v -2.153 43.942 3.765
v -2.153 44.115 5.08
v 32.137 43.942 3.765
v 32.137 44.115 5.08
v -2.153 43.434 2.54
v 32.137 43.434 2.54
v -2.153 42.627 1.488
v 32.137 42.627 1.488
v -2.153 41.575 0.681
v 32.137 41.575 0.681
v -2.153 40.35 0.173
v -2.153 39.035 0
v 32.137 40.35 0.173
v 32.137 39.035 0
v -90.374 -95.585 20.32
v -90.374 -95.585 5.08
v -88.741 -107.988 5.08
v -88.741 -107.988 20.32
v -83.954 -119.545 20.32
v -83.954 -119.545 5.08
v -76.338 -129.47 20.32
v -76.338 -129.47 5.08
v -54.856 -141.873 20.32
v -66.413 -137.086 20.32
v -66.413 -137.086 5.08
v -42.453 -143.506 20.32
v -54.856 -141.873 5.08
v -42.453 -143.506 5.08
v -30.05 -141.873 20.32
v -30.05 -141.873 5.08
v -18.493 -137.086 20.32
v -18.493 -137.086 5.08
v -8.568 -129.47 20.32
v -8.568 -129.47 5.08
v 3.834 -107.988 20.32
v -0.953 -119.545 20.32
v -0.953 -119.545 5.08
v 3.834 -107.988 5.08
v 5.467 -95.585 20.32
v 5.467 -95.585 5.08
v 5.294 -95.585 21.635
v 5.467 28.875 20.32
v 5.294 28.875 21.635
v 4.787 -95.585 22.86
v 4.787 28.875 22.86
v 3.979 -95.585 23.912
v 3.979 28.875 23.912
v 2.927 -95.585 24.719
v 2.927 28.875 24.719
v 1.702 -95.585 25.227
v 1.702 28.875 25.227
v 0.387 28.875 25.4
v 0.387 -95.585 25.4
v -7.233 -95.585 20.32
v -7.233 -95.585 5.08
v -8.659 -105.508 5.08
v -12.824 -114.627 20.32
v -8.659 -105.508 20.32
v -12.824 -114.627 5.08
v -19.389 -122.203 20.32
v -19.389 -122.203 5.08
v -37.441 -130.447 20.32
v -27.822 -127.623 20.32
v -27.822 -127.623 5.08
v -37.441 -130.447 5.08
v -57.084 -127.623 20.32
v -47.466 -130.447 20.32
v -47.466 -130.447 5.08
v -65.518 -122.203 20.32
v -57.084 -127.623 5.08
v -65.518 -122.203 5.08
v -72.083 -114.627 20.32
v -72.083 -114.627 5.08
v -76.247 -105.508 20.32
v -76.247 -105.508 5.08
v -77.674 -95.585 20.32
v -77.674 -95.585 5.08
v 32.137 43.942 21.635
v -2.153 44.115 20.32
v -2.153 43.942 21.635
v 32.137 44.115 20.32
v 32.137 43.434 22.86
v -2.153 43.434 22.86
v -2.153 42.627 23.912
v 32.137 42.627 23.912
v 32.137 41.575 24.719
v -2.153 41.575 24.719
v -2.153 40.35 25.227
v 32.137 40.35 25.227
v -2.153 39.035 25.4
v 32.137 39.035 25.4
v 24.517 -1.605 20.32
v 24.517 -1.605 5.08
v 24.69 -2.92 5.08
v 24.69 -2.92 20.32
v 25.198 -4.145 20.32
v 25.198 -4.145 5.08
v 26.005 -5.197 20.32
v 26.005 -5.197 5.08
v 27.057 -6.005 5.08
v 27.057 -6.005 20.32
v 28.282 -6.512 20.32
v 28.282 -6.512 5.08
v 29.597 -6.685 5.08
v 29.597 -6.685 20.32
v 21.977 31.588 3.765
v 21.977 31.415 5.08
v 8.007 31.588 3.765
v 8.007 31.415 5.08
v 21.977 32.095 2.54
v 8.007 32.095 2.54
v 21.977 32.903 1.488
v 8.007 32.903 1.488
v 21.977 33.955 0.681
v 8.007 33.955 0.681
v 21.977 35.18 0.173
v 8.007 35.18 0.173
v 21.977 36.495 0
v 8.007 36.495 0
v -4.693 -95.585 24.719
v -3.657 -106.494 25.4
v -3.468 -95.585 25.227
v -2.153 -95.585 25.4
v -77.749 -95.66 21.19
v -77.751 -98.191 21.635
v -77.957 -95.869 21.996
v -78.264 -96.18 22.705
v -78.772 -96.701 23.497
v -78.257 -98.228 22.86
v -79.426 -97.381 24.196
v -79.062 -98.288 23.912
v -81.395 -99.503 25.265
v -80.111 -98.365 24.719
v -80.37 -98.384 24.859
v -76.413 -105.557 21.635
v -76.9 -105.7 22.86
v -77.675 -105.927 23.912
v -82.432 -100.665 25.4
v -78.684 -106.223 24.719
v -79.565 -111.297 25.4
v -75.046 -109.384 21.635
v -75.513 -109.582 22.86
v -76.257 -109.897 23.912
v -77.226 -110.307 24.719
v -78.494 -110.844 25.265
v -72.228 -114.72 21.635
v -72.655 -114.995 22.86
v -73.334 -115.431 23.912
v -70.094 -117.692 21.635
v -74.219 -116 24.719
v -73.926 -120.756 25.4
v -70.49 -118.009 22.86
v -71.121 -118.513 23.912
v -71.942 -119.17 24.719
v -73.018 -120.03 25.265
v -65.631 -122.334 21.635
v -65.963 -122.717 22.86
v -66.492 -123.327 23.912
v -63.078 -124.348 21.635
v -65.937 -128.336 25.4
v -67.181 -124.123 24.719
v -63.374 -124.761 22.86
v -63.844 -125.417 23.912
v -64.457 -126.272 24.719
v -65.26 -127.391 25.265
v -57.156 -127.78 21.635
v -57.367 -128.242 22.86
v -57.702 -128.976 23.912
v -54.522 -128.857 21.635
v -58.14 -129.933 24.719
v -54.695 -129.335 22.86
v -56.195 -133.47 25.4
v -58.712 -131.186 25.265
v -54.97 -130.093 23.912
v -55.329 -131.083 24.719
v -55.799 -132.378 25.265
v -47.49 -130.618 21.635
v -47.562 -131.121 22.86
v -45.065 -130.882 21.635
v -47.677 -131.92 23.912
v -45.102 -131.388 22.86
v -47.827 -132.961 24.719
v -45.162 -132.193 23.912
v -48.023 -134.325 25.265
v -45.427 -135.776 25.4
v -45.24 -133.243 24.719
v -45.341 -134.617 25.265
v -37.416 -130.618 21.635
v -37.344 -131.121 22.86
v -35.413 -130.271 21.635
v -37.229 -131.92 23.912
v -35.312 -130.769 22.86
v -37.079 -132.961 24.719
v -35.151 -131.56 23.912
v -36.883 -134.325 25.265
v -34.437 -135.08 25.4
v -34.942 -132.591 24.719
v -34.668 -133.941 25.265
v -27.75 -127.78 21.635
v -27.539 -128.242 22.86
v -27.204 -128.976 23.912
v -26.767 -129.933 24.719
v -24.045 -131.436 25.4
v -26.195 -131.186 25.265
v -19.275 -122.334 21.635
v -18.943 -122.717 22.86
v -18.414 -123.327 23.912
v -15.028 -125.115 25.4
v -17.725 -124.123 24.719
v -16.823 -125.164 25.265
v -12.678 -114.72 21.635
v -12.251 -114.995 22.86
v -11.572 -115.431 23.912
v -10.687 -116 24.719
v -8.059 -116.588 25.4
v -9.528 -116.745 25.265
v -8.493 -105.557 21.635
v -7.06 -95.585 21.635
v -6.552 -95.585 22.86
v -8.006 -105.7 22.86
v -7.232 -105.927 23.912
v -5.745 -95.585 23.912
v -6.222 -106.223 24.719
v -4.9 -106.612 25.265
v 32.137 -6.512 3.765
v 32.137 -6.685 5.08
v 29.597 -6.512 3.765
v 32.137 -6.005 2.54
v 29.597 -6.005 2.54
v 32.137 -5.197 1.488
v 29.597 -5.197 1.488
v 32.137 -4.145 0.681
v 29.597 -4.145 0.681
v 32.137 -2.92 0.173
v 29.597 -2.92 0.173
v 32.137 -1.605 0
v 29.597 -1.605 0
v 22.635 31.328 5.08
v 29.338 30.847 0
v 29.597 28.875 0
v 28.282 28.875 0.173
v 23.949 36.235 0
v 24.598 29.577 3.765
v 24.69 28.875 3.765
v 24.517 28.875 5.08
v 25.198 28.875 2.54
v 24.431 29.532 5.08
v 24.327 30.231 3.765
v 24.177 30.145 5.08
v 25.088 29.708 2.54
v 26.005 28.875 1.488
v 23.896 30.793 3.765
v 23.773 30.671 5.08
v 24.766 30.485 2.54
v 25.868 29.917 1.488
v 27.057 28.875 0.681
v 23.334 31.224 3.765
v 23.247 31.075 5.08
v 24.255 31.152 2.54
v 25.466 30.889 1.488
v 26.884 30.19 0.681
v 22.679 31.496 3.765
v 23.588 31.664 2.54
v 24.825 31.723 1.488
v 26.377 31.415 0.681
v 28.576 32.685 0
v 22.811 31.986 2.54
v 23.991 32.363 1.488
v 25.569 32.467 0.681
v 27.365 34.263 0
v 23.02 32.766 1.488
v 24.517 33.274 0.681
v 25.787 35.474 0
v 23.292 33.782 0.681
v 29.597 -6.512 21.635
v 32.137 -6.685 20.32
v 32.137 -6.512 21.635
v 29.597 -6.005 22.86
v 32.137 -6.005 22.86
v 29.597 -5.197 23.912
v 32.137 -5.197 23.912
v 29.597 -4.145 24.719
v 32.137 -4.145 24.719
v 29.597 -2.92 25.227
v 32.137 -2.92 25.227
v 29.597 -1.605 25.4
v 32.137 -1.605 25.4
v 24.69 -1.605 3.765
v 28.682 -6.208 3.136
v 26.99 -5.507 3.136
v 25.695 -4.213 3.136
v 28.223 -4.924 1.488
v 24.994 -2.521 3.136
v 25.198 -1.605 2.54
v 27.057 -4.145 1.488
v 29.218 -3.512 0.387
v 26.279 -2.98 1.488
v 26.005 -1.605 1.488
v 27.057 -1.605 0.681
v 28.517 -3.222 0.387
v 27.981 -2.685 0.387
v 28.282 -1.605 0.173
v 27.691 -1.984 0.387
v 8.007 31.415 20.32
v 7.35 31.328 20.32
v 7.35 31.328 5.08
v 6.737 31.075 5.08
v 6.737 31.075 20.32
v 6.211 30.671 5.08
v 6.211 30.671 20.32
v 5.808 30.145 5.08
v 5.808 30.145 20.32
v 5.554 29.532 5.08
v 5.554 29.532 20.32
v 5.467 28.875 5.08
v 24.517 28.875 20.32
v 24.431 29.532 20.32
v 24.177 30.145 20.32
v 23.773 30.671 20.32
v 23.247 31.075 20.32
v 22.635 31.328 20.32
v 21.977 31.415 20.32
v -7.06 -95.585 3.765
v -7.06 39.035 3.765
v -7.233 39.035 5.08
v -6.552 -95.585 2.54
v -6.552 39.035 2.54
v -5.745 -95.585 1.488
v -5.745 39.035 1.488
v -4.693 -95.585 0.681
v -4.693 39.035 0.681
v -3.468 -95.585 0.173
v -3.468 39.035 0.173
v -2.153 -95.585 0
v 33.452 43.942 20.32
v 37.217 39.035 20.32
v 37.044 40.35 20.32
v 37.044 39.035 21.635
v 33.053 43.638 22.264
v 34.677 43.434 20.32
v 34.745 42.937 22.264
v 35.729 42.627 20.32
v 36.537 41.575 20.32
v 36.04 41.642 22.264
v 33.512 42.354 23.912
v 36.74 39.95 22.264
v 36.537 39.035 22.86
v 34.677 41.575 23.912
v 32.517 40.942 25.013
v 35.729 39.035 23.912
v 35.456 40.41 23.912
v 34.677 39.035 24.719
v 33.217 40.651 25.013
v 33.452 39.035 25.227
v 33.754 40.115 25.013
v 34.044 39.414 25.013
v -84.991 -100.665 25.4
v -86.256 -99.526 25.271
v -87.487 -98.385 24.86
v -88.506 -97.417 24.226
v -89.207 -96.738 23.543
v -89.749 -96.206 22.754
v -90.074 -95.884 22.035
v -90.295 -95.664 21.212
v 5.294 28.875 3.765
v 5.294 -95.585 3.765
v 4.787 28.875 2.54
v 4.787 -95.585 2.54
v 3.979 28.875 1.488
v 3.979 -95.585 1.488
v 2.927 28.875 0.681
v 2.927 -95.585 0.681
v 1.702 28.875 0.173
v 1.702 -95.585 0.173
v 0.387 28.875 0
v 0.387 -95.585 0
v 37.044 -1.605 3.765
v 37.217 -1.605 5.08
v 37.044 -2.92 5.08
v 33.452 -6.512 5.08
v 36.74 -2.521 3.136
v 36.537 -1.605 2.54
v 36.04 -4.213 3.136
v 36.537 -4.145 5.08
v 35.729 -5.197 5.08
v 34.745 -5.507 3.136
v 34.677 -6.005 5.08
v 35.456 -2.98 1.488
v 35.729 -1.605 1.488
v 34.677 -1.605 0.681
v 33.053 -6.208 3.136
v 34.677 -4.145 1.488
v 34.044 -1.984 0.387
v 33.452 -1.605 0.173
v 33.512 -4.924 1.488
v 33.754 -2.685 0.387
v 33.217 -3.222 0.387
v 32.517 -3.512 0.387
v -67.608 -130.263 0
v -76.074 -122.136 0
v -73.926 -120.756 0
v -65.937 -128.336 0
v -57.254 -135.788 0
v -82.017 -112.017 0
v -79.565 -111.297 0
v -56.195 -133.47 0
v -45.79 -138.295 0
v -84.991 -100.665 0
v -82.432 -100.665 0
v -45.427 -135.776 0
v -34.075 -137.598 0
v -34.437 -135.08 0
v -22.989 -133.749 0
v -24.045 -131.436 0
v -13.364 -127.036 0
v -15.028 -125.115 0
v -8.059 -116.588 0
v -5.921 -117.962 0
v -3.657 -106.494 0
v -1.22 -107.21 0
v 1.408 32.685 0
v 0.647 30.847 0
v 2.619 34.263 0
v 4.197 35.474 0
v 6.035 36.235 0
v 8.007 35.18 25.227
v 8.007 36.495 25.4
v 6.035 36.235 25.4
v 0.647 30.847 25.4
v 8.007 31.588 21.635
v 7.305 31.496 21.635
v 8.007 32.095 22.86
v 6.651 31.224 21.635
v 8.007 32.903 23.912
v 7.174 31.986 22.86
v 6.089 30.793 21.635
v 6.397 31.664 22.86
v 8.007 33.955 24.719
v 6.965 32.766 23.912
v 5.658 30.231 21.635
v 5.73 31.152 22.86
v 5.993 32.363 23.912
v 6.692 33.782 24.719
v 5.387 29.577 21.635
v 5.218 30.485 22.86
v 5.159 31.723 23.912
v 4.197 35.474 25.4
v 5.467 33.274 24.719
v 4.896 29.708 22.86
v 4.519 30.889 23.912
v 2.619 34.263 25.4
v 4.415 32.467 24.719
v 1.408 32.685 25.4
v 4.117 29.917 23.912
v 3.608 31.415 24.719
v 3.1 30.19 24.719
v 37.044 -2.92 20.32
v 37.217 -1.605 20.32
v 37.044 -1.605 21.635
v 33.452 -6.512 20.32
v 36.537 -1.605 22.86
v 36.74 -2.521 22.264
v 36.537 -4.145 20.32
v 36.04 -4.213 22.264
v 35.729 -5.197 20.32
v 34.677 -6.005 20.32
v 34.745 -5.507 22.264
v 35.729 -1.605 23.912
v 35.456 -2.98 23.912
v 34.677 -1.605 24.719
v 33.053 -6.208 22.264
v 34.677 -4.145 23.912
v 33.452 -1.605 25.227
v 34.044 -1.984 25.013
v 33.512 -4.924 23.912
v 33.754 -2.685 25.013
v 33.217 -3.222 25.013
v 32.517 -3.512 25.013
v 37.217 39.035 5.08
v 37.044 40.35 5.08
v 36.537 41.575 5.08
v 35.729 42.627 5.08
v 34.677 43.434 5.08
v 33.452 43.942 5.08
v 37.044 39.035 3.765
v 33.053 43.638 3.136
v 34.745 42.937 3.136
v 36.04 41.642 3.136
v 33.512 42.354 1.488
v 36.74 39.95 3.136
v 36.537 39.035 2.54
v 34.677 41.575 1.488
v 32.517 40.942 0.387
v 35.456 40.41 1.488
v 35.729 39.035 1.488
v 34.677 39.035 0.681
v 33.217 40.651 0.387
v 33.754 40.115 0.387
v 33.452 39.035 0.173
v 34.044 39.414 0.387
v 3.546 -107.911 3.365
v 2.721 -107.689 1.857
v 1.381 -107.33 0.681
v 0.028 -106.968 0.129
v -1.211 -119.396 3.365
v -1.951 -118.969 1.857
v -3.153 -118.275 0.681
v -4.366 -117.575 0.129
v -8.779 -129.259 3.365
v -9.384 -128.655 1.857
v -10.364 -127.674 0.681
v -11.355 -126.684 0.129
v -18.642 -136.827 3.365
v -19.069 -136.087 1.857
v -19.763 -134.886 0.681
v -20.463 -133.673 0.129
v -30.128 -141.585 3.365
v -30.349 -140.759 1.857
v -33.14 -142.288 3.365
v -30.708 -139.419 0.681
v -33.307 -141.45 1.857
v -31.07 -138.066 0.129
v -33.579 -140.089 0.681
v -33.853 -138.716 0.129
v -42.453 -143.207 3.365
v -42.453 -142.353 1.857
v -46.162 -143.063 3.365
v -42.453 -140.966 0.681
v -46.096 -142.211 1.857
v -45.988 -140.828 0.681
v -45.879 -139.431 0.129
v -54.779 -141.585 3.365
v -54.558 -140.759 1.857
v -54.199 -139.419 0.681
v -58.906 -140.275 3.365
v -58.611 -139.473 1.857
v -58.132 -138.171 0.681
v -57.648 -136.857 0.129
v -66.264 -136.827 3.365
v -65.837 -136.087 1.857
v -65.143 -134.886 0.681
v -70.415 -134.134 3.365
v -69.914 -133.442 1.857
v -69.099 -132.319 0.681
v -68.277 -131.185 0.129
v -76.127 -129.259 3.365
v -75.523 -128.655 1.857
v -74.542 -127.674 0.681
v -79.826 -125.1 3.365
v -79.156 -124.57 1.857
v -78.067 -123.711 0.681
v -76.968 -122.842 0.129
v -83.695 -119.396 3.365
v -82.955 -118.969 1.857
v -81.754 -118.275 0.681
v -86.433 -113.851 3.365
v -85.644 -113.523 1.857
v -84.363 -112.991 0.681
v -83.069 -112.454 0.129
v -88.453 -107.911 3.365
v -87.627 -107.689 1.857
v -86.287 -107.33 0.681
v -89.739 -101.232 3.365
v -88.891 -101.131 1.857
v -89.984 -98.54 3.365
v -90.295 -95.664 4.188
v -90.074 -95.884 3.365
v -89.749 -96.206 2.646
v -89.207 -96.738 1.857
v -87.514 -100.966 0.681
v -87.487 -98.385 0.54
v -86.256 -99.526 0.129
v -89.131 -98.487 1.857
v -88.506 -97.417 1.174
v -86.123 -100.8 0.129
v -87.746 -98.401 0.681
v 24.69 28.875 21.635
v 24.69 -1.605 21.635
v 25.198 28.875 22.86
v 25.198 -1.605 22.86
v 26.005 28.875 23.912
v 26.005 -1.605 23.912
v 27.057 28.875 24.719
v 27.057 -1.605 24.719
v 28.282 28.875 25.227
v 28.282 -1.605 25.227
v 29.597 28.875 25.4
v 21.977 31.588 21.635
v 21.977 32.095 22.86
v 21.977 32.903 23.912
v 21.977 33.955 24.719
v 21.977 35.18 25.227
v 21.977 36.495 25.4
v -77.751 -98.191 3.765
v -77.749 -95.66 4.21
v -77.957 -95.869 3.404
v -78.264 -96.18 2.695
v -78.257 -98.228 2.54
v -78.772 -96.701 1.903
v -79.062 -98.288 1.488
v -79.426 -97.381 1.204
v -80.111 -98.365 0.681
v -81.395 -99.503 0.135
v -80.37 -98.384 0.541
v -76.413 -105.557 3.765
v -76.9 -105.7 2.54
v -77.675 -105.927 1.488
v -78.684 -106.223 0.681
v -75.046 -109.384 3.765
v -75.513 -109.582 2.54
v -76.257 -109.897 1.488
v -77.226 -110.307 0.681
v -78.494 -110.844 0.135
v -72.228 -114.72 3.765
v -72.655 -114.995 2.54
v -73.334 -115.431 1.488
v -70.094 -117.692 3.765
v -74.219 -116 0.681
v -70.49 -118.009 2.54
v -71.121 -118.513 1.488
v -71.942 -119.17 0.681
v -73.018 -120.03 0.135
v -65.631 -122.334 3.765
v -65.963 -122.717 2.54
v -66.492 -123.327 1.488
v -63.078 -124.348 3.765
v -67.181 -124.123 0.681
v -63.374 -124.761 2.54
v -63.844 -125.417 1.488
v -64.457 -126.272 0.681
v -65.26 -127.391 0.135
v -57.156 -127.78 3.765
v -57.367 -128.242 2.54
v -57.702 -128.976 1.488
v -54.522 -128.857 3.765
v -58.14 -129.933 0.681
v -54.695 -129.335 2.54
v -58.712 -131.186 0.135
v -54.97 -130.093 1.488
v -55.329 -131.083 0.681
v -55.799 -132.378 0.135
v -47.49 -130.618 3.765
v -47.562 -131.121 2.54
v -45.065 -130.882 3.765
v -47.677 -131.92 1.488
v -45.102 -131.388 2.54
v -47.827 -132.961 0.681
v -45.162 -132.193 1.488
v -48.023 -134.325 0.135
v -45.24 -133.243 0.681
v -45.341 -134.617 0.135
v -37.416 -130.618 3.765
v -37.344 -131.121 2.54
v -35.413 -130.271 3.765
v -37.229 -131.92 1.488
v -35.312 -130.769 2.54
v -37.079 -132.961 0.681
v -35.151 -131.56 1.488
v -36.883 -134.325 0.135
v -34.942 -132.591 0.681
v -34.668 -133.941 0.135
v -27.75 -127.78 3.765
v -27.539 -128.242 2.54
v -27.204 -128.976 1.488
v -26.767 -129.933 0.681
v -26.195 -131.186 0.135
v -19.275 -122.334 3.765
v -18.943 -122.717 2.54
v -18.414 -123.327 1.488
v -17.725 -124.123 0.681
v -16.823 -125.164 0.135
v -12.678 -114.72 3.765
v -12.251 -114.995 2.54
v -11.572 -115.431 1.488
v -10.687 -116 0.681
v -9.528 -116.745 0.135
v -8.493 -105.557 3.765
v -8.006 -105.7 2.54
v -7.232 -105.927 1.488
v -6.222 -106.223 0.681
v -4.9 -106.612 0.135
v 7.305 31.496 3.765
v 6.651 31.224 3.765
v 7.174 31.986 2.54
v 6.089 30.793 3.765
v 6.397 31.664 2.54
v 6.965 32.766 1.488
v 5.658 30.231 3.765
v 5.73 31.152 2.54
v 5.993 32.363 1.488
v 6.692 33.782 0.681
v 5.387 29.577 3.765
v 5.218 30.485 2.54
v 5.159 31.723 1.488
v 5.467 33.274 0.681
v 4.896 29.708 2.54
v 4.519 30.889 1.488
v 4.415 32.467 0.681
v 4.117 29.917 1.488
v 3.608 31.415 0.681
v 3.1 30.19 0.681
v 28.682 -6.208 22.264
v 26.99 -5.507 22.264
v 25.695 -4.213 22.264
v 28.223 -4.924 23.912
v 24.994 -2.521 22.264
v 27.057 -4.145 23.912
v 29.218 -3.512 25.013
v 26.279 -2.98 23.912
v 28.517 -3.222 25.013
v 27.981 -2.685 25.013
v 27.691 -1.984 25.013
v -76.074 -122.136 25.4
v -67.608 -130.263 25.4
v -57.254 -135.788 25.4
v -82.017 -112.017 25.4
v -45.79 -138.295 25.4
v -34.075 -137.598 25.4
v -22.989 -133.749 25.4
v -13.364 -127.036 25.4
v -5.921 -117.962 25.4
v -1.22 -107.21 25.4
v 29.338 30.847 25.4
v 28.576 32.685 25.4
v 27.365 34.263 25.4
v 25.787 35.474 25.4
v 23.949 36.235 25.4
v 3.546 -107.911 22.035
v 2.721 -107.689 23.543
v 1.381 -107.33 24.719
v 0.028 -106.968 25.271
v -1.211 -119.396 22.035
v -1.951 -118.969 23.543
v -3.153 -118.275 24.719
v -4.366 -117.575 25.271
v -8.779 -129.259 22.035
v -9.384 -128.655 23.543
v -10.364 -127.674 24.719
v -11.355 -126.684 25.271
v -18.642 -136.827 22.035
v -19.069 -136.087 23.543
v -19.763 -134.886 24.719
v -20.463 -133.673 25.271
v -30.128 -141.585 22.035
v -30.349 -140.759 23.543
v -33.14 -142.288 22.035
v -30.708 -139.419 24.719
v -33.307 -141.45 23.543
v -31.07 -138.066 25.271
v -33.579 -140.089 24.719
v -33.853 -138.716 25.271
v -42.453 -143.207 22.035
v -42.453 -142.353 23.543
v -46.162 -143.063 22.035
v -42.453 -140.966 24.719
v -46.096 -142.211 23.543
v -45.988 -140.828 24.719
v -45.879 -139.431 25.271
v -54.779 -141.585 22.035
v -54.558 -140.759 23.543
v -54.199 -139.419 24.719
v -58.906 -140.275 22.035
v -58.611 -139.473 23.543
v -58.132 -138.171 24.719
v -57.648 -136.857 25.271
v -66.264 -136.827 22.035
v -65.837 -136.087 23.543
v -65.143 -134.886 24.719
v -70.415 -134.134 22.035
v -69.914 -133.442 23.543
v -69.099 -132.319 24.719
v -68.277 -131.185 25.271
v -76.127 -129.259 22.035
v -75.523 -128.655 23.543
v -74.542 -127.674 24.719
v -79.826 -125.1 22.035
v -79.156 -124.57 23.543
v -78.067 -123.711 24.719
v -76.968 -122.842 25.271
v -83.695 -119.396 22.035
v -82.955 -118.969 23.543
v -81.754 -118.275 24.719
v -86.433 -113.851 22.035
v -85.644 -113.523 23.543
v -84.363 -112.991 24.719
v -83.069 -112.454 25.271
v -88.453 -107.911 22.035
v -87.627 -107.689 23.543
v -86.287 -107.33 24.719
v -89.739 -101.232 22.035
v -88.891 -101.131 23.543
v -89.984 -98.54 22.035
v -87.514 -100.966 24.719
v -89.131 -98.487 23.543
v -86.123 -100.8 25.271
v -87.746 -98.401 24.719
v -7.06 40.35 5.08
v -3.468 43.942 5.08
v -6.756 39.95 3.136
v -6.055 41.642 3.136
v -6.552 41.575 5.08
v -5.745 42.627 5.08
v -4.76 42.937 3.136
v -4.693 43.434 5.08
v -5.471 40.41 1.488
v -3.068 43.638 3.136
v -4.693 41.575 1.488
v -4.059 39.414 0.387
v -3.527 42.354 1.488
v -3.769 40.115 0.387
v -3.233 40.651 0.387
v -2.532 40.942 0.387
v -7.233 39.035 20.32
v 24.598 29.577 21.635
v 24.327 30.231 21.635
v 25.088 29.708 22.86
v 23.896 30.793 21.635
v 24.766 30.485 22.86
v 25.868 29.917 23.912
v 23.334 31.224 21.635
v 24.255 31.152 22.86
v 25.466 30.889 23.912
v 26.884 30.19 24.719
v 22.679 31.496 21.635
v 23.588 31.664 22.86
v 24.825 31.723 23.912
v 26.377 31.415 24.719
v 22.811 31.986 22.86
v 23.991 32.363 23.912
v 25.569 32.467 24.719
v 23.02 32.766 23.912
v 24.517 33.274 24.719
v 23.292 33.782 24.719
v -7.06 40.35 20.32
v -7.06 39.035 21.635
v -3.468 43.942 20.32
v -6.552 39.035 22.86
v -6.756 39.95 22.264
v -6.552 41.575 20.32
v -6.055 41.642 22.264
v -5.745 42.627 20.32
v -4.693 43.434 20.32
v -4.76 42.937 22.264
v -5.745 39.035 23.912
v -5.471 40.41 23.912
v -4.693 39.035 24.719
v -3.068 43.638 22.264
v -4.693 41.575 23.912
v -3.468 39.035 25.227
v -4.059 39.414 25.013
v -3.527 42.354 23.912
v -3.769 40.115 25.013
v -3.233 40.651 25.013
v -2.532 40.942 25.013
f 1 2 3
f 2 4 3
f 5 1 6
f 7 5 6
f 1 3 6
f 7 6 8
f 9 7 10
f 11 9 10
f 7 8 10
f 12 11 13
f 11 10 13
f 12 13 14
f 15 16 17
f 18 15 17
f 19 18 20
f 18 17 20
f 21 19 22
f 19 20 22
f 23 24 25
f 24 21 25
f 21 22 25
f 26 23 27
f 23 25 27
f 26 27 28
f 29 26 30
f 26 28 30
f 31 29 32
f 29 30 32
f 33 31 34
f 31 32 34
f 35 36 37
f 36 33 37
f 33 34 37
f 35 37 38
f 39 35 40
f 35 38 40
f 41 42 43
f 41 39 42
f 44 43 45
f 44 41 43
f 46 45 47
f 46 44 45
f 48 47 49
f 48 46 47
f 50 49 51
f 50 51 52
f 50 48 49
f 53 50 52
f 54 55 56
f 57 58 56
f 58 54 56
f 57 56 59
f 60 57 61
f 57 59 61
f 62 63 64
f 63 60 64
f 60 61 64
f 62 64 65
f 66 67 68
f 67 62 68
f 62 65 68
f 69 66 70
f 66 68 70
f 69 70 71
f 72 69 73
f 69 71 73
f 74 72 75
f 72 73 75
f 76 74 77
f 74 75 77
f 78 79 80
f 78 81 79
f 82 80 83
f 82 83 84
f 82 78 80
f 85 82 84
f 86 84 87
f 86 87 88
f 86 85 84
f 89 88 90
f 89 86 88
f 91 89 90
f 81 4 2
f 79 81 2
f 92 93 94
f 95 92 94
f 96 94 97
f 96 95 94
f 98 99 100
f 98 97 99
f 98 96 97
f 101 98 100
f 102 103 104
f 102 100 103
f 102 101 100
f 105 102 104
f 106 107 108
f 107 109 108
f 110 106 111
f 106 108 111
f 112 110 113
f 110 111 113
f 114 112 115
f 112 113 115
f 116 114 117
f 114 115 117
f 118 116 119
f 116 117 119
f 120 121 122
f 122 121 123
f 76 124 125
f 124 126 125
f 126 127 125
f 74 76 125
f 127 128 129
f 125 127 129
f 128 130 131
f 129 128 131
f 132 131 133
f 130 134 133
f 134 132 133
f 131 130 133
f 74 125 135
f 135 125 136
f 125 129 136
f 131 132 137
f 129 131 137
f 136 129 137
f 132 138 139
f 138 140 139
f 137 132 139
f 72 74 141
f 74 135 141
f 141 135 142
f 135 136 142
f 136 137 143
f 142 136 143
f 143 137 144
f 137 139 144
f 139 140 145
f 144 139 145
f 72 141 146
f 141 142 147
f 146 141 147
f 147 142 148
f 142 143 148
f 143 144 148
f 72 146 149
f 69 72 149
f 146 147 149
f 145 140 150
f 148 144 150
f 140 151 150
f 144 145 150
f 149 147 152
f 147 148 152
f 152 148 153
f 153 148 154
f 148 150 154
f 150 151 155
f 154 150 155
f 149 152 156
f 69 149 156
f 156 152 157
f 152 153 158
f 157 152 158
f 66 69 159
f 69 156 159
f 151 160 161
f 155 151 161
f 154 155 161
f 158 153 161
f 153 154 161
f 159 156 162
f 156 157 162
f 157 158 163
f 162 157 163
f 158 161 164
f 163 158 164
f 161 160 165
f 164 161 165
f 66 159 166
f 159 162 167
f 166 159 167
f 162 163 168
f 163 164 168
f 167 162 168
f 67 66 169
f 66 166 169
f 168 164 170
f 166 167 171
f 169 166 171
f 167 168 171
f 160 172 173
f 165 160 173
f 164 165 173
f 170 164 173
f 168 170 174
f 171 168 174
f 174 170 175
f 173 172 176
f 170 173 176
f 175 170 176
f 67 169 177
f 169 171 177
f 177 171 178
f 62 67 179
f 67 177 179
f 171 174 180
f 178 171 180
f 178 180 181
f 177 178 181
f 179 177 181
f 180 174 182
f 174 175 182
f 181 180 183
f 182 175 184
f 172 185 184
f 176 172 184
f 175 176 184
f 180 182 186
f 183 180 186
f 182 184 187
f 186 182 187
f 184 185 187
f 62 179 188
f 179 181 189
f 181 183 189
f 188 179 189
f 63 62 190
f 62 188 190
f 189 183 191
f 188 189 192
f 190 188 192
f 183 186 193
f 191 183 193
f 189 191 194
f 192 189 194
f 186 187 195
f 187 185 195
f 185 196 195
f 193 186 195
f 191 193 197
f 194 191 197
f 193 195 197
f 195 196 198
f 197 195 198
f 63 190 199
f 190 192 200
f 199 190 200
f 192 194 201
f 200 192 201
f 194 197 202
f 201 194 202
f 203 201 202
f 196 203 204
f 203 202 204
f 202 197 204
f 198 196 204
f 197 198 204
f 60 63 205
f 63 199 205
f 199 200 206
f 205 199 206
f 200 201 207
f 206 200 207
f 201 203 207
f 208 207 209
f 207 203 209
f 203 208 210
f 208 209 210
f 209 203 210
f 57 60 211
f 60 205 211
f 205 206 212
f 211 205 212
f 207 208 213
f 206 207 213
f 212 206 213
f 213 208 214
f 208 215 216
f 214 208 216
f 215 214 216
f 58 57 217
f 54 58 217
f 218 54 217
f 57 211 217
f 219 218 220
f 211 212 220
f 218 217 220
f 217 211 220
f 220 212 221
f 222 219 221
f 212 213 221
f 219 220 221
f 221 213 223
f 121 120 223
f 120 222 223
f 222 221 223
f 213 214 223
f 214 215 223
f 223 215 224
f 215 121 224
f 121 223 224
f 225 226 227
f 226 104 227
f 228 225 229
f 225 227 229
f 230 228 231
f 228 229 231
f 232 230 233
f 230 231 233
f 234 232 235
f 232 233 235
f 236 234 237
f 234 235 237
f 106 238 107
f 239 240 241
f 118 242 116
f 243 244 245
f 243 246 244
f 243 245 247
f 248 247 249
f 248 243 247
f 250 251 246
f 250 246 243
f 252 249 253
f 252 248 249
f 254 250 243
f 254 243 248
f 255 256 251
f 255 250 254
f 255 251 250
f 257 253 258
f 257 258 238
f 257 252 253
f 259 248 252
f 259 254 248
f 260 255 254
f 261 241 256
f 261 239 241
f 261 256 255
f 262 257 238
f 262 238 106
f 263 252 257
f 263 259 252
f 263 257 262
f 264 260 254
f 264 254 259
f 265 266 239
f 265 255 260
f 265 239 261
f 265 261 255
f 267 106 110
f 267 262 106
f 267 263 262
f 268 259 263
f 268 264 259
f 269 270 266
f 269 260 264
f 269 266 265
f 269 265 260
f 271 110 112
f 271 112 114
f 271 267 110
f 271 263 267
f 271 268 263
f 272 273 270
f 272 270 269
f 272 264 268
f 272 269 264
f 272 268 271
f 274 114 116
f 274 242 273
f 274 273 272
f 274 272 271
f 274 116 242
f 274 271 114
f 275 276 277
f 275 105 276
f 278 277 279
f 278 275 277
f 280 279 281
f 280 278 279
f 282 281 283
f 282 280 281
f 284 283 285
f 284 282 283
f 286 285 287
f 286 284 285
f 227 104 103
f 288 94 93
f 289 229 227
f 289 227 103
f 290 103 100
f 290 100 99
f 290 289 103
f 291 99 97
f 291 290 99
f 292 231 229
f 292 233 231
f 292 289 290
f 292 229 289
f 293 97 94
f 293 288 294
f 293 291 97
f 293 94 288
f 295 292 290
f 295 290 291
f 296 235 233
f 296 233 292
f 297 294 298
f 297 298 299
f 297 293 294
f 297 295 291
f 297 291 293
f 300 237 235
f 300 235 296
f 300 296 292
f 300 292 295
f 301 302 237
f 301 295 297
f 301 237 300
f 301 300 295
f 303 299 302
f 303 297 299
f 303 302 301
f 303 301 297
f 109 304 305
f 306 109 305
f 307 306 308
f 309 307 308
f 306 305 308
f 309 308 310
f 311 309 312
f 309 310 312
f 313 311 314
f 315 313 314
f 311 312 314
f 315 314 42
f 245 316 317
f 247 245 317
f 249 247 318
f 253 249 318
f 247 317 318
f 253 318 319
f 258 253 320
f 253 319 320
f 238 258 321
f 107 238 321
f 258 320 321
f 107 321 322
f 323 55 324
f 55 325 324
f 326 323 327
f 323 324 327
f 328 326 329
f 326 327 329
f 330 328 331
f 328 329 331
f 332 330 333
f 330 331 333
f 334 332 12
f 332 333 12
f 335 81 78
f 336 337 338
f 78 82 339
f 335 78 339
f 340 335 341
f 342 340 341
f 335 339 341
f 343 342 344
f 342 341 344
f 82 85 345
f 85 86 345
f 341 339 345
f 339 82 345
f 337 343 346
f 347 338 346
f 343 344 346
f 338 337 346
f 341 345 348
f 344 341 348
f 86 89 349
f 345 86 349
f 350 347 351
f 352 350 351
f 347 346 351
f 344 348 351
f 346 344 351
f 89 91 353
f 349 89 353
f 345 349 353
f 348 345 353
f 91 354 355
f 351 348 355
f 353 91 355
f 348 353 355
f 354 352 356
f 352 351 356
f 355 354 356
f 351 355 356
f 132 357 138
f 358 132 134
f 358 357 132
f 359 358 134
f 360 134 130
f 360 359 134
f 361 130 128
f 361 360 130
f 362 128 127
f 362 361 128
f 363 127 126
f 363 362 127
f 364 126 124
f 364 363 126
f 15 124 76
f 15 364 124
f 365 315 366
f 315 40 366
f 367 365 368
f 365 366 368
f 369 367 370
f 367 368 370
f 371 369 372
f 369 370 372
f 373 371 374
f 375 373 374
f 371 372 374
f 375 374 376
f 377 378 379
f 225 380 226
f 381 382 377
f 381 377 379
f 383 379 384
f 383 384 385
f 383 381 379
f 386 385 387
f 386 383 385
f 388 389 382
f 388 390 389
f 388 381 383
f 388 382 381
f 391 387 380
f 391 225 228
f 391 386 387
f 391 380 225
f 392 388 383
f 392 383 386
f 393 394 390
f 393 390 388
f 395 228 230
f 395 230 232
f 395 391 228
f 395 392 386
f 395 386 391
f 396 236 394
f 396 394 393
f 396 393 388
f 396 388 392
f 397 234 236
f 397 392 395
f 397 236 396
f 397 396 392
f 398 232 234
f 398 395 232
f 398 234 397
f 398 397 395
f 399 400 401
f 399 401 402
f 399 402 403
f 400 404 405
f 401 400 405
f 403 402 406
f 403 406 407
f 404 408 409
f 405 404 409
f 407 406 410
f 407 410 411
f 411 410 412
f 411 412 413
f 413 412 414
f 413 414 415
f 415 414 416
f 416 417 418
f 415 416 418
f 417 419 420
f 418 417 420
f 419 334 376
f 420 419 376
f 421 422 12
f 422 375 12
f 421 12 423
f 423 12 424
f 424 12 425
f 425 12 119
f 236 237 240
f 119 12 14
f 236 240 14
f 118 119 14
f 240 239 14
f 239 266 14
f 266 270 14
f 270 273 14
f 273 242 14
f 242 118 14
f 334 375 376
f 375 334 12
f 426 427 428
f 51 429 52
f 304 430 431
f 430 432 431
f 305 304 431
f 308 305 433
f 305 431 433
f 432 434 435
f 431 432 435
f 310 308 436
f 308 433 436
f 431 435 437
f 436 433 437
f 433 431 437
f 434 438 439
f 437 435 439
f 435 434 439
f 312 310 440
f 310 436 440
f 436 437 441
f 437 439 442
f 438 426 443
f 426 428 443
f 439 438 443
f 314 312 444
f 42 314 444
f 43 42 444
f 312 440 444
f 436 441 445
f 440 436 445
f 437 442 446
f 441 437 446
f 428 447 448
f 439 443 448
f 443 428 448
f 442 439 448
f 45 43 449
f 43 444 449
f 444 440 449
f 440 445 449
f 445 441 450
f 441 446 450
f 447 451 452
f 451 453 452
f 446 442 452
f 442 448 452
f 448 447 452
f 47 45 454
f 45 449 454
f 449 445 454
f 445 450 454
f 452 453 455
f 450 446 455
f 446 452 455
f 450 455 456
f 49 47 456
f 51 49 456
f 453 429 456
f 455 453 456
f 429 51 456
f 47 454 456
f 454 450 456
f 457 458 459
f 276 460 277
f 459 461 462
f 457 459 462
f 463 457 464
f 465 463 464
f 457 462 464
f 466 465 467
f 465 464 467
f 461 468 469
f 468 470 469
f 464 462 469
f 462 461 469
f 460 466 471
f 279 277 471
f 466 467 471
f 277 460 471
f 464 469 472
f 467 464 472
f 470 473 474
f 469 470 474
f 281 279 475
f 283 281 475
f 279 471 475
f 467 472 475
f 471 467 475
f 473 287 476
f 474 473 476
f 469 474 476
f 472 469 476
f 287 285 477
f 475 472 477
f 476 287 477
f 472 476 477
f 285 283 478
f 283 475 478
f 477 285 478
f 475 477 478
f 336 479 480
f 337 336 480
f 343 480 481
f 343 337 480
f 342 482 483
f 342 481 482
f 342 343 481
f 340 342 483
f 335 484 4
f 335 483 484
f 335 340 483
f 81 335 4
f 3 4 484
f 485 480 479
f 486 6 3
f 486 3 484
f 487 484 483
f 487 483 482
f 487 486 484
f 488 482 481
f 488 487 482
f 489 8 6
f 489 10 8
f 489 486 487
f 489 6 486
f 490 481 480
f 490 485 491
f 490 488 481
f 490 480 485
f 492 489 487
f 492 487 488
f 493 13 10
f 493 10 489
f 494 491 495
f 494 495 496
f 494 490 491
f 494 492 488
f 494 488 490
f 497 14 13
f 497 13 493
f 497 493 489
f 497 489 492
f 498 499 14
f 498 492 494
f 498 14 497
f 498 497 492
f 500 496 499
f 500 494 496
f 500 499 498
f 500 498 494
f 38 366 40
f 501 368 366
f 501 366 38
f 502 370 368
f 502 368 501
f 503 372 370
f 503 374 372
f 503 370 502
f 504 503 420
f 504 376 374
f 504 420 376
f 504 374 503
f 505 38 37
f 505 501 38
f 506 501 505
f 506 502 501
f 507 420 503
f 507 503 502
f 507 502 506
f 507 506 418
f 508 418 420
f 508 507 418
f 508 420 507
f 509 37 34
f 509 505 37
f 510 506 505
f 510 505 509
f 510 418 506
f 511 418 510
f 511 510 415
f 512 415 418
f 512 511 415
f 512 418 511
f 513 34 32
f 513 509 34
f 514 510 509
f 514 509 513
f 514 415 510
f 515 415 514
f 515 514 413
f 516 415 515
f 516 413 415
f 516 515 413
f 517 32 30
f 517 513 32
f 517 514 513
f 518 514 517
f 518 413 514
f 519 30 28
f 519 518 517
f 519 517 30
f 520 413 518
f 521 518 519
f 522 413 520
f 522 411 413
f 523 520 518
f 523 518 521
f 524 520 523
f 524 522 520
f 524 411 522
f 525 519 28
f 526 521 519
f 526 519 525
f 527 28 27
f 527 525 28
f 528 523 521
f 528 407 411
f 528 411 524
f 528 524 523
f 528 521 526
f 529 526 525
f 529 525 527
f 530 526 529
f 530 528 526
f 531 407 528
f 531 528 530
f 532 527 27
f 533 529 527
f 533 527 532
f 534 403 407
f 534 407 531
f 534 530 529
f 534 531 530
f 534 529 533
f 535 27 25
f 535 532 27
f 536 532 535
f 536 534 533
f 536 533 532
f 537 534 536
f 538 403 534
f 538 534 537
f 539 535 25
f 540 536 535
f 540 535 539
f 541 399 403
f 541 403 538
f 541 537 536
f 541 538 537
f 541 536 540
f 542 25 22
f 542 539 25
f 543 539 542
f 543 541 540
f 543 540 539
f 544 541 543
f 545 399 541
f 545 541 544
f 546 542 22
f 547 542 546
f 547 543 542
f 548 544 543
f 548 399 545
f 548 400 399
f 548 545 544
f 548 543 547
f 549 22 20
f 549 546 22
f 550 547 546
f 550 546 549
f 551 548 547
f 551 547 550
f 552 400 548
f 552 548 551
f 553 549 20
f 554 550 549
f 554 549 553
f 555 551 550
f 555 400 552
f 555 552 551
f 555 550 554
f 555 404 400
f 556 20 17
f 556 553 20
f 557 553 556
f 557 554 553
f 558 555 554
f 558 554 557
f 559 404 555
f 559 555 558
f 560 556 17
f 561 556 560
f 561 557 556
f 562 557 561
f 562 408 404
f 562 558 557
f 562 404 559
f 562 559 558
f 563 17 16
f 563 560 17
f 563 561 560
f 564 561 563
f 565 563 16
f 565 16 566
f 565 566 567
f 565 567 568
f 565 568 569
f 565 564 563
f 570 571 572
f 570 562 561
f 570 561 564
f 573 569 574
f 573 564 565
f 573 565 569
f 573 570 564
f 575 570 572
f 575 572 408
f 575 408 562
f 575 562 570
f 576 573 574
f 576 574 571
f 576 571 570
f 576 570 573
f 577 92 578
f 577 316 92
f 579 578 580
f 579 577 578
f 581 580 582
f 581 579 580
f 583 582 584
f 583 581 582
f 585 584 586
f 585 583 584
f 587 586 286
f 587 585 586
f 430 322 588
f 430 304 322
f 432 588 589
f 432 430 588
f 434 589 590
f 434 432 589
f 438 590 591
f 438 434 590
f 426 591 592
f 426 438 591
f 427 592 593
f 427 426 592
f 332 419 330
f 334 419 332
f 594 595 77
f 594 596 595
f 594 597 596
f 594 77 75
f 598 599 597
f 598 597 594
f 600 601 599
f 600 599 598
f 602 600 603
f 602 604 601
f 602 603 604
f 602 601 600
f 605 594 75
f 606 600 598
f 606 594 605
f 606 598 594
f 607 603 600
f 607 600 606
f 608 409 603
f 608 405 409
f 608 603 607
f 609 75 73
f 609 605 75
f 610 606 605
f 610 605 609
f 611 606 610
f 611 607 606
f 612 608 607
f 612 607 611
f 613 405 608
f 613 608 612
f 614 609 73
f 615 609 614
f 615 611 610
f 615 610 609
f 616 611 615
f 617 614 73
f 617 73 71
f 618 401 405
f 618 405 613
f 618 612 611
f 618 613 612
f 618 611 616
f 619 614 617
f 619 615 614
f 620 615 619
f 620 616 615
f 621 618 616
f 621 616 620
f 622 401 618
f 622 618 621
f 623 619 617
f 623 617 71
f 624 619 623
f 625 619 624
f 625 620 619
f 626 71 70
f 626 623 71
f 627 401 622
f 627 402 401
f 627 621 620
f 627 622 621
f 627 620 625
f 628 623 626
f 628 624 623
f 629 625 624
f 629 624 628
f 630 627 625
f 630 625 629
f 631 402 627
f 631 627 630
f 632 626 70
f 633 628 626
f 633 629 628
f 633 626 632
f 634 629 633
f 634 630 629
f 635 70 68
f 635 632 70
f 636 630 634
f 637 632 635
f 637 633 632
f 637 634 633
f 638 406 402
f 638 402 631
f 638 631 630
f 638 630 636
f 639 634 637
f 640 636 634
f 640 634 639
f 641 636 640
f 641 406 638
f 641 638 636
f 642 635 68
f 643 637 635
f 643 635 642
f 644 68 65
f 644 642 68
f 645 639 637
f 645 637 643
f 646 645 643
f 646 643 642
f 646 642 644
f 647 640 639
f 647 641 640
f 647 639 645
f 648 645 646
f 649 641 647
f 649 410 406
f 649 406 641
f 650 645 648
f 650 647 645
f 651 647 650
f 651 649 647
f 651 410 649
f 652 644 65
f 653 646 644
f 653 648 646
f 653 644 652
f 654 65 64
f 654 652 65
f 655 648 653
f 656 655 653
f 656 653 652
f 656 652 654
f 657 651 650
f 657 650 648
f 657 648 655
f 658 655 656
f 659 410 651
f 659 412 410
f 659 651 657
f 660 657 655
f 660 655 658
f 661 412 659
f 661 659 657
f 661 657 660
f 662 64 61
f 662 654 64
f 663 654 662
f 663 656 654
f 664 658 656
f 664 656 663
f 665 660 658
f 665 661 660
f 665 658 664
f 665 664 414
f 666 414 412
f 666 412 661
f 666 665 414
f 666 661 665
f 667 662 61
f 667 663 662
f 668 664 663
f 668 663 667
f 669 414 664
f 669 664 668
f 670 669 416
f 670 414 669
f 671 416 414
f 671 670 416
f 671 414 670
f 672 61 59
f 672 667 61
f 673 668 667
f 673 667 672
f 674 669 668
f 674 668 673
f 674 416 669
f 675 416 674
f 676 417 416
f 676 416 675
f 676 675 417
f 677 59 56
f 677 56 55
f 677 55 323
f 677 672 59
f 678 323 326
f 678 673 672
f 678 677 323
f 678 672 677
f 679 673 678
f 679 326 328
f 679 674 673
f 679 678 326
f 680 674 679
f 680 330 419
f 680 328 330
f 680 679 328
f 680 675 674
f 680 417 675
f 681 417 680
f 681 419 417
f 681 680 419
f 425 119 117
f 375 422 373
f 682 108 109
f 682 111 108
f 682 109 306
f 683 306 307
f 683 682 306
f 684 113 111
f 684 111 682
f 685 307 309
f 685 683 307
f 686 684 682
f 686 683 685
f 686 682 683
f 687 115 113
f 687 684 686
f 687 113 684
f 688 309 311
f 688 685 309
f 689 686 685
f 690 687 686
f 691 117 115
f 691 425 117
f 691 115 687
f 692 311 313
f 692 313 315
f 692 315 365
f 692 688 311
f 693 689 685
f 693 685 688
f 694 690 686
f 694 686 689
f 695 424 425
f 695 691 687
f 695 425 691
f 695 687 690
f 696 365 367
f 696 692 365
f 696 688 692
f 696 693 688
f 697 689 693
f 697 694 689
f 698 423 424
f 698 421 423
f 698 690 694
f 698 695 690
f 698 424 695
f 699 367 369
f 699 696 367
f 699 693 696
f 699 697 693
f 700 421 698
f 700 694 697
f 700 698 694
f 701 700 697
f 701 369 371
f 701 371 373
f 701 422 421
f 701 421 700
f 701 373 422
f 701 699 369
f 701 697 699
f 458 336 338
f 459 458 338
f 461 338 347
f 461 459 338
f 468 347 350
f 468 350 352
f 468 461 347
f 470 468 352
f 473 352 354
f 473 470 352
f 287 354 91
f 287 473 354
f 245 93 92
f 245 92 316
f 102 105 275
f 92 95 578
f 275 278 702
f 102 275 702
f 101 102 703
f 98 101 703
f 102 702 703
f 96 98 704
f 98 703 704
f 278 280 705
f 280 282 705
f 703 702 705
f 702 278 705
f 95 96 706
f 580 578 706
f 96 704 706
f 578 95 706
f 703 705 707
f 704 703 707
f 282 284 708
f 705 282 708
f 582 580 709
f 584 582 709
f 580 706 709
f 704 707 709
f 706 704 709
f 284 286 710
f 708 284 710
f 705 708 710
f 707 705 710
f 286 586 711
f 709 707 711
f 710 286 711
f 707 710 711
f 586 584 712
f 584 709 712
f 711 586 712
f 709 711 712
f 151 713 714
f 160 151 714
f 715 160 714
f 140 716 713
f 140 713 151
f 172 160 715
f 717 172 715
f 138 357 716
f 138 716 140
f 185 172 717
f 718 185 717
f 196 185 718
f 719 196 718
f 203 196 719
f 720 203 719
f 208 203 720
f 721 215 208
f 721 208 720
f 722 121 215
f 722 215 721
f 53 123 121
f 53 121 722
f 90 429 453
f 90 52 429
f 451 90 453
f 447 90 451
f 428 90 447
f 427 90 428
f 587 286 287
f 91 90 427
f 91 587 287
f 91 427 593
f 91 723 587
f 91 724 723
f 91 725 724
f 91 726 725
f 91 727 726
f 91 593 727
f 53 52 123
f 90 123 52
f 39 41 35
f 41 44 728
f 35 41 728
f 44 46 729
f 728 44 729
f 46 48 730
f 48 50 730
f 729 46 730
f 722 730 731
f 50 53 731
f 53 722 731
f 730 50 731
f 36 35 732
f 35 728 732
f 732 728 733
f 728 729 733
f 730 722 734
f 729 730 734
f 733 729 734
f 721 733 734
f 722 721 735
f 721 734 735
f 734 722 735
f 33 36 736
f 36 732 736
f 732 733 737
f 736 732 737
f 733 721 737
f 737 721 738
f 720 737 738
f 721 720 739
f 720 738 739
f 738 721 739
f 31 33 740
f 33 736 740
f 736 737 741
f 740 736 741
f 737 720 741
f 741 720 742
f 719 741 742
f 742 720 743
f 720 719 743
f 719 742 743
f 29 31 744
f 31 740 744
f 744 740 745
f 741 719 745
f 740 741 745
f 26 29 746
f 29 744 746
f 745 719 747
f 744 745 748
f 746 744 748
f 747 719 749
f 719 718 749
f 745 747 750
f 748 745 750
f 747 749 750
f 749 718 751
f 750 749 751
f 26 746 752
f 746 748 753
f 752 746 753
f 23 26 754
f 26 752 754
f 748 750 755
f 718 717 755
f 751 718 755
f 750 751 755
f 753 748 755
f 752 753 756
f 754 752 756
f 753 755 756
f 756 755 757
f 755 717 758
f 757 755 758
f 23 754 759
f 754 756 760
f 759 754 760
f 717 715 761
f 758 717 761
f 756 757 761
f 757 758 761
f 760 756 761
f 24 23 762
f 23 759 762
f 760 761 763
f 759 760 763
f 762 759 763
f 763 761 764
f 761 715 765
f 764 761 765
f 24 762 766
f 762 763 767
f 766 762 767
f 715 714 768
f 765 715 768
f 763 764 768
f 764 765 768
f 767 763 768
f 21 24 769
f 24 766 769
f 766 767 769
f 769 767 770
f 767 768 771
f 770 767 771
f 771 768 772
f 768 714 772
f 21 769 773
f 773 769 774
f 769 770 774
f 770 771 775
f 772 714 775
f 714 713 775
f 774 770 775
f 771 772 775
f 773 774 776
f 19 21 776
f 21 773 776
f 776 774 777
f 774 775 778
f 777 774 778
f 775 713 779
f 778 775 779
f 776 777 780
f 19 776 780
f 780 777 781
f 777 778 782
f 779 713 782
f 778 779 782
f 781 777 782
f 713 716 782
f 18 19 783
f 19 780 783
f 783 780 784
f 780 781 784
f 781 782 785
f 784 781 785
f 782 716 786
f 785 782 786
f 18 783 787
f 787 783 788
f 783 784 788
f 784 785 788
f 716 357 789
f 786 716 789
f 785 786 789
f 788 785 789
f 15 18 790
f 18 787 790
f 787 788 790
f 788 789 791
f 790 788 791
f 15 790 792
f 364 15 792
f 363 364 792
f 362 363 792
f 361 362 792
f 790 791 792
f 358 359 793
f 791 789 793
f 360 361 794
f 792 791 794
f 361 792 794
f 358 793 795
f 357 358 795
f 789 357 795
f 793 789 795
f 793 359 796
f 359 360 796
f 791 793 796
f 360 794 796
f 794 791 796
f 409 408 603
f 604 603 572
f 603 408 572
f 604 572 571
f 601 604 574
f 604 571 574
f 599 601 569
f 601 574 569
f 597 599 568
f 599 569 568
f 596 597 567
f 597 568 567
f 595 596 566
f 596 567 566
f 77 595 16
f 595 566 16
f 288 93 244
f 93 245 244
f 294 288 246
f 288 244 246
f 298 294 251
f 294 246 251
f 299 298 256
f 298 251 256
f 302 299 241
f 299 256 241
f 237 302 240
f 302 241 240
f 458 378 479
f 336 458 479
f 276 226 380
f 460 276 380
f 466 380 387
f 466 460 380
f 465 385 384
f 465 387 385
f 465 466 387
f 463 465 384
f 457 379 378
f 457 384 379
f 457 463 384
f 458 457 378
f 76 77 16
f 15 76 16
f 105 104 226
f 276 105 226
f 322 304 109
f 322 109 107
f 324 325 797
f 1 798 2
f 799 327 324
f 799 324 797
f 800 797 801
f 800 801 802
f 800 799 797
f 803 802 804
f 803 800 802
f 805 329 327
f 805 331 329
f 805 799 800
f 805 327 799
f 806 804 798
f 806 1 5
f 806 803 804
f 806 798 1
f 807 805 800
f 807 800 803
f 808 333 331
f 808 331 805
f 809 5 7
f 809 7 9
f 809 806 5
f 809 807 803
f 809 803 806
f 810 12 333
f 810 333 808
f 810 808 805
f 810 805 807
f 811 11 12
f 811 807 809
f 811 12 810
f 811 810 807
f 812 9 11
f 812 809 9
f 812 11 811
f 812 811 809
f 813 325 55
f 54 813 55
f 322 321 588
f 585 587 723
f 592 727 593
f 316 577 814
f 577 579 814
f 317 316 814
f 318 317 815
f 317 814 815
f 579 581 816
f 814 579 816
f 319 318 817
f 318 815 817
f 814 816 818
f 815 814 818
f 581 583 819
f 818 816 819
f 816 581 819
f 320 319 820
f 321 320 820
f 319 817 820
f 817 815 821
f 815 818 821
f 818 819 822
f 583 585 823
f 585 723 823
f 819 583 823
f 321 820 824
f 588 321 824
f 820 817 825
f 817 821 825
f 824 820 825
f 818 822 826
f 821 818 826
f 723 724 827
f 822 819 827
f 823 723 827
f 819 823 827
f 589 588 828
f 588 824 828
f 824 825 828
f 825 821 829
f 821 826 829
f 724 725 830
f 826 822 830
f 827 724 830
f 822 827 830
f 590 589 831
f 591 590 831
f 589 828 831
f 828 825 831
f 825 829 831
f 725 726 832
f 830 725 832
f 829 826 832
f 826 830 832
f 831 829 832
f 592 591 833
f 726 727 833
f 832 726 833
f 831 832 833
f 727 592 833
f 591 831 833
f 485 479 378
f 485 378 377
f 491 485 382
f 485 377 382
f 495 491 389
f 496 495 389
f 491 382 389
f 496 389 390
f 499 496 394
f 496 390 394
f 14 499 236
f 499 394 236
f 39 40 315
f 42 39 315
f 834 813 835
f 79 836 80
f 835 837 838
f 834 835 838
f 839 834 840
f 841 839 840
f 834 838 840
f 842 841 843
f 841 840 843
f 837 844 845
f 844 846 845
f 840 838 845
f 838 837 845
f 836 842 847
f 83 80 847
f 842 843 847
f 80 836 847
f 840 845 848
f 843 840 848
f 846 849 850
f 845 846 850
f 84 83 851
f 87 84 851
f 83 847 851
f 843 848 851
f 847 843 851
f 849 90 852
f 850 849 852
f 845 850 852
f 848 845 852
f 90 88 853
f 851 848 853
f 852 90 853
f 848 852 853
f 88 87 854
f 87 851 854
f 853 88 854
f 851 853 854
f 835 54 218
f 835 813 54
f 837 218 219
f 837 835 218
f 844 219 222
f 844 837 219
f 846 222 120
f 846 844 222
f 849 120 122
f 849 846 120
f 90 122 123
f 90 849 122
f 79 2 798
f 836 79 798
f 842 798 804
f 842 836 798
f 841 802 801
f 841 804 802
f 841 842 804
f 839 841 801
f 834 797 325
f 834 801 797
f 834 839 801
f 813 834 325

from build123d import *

# Parameters (mm, degrees)
F0_W     = 12.7
F0_H     = 38.1
F1_DEPTH = 25.4
F2_R     = 5.08
F3_R     = 2.54
F4_R     = 5.08


with BuildPart() as f1:
    # F0 (on Top) → F1 (new body)
    with BuildSketch(Plane.XY):
        with BuildLine():
            Line((5.467289, 31.414881), (-7.232711, 31.414881))
            Line((-7.232711, 31.414881), (-7.232711, -95.585119))
            ThreePointArc((-7.232711, -95.585119), (-42.453229, -130.805637), (-77.673748, -95.585119))
            Line((-77.673748, -95.585119), (-90.373748, -95.585119))
            ThreePointArc((-90.373748, -95.585119), (-42.453229, -143.505637), (5.467289, -95.585119))
            Line((5.467289, -95.585119), (5.467289, 31.414881))
        make_face()
        Polygon((-7.232711, 44.114881), (-7.232711, 31.414881), (5.467289, 31.414881), (24.517289, 31.414881), (37.217289, 31.414881), (37.217289, 44.114881), align=None)
        with Locations((30.867289, 12.364881)):
            Rectangle(F0_W, F0_H)
    extrude(amount=F1_DEPTH)

    # F2
    f2_edges = [f1.edges().sort_by_distance(p)[0] for p in [
        (37.217289, -6.685119, 12.7),
        (24.517289, -6.685119, 12.7),
        (37.217289, 44.114881, 12.7),
        (-7.232711, 44.114881, 12.7),
    ]]
    fillet(f2_edges, radius=F2_R)

    # F3
    f3_edges = [f1.edges().sort_by_distance(p)[0] for p in [
        (5.467289, 31.414881, 12.7),
        (24.517289, 31.414881, 12.7),
    ]]
    fillet(f3_edges, radius=F3_R)

    # F4
    f4_edges = [f1.edges().sort_by_distance(p)[0] for p in [
        (24.517289, 13.634881, 25.4),
        (23.77334, 30.670933, 25.4),
        (26.005187, -5.197221, 25.4),
        (14.992289, 31.414881, 25.4),
        (30.867289, -6.685119, 25.4),
        (6.211238, 30.670933, 25.4),
        (35.729392, -5.197221, 25.4),
        (5.467289, -33.355119, 25.4),
        (37.217289, 18.714881, 25.4),
        (-42.453229, -143.505637, 25.4),
        (35.729392, 42.626984, 25.4),
        (-84.023748, -95.585119, 25.4),
        (14.992289, 44.114881, 25.4),
        (-42.453229, -130.805637, 25.4),
        (-5.744813, 42.626984, 25.4),
        (-7.232711, -28.275119, 25.4),
        (24.517289, 13.634881, 0),
        (23.77334, 30.670933, 0),
        (26.005187, -5.197221, 0),
        (14.992289, 31.414881, 0),
        (30.867289, -6.685119, 0),
        (6.211238, 30.670933, 0),
        (35.729392, -5.197221, 0),
        (5.467289, -33.355119, 0),
        (37.217289, 18.714881, 0),
        (-42.453229, -143.505637, 0),
        (35.729392, 42.626984, 0),
        (-84.023748, -95.585119, 0),
        (14.992289, 44.114881, 0),
        (-42.453229, -130.805637, 0),
        (-5.744813, 42.626984, 0),
        (-7.232711, -28.275119, 0),
    ]]
    fillet(f4_edges, radius=F4_R)


solid = f1.part
